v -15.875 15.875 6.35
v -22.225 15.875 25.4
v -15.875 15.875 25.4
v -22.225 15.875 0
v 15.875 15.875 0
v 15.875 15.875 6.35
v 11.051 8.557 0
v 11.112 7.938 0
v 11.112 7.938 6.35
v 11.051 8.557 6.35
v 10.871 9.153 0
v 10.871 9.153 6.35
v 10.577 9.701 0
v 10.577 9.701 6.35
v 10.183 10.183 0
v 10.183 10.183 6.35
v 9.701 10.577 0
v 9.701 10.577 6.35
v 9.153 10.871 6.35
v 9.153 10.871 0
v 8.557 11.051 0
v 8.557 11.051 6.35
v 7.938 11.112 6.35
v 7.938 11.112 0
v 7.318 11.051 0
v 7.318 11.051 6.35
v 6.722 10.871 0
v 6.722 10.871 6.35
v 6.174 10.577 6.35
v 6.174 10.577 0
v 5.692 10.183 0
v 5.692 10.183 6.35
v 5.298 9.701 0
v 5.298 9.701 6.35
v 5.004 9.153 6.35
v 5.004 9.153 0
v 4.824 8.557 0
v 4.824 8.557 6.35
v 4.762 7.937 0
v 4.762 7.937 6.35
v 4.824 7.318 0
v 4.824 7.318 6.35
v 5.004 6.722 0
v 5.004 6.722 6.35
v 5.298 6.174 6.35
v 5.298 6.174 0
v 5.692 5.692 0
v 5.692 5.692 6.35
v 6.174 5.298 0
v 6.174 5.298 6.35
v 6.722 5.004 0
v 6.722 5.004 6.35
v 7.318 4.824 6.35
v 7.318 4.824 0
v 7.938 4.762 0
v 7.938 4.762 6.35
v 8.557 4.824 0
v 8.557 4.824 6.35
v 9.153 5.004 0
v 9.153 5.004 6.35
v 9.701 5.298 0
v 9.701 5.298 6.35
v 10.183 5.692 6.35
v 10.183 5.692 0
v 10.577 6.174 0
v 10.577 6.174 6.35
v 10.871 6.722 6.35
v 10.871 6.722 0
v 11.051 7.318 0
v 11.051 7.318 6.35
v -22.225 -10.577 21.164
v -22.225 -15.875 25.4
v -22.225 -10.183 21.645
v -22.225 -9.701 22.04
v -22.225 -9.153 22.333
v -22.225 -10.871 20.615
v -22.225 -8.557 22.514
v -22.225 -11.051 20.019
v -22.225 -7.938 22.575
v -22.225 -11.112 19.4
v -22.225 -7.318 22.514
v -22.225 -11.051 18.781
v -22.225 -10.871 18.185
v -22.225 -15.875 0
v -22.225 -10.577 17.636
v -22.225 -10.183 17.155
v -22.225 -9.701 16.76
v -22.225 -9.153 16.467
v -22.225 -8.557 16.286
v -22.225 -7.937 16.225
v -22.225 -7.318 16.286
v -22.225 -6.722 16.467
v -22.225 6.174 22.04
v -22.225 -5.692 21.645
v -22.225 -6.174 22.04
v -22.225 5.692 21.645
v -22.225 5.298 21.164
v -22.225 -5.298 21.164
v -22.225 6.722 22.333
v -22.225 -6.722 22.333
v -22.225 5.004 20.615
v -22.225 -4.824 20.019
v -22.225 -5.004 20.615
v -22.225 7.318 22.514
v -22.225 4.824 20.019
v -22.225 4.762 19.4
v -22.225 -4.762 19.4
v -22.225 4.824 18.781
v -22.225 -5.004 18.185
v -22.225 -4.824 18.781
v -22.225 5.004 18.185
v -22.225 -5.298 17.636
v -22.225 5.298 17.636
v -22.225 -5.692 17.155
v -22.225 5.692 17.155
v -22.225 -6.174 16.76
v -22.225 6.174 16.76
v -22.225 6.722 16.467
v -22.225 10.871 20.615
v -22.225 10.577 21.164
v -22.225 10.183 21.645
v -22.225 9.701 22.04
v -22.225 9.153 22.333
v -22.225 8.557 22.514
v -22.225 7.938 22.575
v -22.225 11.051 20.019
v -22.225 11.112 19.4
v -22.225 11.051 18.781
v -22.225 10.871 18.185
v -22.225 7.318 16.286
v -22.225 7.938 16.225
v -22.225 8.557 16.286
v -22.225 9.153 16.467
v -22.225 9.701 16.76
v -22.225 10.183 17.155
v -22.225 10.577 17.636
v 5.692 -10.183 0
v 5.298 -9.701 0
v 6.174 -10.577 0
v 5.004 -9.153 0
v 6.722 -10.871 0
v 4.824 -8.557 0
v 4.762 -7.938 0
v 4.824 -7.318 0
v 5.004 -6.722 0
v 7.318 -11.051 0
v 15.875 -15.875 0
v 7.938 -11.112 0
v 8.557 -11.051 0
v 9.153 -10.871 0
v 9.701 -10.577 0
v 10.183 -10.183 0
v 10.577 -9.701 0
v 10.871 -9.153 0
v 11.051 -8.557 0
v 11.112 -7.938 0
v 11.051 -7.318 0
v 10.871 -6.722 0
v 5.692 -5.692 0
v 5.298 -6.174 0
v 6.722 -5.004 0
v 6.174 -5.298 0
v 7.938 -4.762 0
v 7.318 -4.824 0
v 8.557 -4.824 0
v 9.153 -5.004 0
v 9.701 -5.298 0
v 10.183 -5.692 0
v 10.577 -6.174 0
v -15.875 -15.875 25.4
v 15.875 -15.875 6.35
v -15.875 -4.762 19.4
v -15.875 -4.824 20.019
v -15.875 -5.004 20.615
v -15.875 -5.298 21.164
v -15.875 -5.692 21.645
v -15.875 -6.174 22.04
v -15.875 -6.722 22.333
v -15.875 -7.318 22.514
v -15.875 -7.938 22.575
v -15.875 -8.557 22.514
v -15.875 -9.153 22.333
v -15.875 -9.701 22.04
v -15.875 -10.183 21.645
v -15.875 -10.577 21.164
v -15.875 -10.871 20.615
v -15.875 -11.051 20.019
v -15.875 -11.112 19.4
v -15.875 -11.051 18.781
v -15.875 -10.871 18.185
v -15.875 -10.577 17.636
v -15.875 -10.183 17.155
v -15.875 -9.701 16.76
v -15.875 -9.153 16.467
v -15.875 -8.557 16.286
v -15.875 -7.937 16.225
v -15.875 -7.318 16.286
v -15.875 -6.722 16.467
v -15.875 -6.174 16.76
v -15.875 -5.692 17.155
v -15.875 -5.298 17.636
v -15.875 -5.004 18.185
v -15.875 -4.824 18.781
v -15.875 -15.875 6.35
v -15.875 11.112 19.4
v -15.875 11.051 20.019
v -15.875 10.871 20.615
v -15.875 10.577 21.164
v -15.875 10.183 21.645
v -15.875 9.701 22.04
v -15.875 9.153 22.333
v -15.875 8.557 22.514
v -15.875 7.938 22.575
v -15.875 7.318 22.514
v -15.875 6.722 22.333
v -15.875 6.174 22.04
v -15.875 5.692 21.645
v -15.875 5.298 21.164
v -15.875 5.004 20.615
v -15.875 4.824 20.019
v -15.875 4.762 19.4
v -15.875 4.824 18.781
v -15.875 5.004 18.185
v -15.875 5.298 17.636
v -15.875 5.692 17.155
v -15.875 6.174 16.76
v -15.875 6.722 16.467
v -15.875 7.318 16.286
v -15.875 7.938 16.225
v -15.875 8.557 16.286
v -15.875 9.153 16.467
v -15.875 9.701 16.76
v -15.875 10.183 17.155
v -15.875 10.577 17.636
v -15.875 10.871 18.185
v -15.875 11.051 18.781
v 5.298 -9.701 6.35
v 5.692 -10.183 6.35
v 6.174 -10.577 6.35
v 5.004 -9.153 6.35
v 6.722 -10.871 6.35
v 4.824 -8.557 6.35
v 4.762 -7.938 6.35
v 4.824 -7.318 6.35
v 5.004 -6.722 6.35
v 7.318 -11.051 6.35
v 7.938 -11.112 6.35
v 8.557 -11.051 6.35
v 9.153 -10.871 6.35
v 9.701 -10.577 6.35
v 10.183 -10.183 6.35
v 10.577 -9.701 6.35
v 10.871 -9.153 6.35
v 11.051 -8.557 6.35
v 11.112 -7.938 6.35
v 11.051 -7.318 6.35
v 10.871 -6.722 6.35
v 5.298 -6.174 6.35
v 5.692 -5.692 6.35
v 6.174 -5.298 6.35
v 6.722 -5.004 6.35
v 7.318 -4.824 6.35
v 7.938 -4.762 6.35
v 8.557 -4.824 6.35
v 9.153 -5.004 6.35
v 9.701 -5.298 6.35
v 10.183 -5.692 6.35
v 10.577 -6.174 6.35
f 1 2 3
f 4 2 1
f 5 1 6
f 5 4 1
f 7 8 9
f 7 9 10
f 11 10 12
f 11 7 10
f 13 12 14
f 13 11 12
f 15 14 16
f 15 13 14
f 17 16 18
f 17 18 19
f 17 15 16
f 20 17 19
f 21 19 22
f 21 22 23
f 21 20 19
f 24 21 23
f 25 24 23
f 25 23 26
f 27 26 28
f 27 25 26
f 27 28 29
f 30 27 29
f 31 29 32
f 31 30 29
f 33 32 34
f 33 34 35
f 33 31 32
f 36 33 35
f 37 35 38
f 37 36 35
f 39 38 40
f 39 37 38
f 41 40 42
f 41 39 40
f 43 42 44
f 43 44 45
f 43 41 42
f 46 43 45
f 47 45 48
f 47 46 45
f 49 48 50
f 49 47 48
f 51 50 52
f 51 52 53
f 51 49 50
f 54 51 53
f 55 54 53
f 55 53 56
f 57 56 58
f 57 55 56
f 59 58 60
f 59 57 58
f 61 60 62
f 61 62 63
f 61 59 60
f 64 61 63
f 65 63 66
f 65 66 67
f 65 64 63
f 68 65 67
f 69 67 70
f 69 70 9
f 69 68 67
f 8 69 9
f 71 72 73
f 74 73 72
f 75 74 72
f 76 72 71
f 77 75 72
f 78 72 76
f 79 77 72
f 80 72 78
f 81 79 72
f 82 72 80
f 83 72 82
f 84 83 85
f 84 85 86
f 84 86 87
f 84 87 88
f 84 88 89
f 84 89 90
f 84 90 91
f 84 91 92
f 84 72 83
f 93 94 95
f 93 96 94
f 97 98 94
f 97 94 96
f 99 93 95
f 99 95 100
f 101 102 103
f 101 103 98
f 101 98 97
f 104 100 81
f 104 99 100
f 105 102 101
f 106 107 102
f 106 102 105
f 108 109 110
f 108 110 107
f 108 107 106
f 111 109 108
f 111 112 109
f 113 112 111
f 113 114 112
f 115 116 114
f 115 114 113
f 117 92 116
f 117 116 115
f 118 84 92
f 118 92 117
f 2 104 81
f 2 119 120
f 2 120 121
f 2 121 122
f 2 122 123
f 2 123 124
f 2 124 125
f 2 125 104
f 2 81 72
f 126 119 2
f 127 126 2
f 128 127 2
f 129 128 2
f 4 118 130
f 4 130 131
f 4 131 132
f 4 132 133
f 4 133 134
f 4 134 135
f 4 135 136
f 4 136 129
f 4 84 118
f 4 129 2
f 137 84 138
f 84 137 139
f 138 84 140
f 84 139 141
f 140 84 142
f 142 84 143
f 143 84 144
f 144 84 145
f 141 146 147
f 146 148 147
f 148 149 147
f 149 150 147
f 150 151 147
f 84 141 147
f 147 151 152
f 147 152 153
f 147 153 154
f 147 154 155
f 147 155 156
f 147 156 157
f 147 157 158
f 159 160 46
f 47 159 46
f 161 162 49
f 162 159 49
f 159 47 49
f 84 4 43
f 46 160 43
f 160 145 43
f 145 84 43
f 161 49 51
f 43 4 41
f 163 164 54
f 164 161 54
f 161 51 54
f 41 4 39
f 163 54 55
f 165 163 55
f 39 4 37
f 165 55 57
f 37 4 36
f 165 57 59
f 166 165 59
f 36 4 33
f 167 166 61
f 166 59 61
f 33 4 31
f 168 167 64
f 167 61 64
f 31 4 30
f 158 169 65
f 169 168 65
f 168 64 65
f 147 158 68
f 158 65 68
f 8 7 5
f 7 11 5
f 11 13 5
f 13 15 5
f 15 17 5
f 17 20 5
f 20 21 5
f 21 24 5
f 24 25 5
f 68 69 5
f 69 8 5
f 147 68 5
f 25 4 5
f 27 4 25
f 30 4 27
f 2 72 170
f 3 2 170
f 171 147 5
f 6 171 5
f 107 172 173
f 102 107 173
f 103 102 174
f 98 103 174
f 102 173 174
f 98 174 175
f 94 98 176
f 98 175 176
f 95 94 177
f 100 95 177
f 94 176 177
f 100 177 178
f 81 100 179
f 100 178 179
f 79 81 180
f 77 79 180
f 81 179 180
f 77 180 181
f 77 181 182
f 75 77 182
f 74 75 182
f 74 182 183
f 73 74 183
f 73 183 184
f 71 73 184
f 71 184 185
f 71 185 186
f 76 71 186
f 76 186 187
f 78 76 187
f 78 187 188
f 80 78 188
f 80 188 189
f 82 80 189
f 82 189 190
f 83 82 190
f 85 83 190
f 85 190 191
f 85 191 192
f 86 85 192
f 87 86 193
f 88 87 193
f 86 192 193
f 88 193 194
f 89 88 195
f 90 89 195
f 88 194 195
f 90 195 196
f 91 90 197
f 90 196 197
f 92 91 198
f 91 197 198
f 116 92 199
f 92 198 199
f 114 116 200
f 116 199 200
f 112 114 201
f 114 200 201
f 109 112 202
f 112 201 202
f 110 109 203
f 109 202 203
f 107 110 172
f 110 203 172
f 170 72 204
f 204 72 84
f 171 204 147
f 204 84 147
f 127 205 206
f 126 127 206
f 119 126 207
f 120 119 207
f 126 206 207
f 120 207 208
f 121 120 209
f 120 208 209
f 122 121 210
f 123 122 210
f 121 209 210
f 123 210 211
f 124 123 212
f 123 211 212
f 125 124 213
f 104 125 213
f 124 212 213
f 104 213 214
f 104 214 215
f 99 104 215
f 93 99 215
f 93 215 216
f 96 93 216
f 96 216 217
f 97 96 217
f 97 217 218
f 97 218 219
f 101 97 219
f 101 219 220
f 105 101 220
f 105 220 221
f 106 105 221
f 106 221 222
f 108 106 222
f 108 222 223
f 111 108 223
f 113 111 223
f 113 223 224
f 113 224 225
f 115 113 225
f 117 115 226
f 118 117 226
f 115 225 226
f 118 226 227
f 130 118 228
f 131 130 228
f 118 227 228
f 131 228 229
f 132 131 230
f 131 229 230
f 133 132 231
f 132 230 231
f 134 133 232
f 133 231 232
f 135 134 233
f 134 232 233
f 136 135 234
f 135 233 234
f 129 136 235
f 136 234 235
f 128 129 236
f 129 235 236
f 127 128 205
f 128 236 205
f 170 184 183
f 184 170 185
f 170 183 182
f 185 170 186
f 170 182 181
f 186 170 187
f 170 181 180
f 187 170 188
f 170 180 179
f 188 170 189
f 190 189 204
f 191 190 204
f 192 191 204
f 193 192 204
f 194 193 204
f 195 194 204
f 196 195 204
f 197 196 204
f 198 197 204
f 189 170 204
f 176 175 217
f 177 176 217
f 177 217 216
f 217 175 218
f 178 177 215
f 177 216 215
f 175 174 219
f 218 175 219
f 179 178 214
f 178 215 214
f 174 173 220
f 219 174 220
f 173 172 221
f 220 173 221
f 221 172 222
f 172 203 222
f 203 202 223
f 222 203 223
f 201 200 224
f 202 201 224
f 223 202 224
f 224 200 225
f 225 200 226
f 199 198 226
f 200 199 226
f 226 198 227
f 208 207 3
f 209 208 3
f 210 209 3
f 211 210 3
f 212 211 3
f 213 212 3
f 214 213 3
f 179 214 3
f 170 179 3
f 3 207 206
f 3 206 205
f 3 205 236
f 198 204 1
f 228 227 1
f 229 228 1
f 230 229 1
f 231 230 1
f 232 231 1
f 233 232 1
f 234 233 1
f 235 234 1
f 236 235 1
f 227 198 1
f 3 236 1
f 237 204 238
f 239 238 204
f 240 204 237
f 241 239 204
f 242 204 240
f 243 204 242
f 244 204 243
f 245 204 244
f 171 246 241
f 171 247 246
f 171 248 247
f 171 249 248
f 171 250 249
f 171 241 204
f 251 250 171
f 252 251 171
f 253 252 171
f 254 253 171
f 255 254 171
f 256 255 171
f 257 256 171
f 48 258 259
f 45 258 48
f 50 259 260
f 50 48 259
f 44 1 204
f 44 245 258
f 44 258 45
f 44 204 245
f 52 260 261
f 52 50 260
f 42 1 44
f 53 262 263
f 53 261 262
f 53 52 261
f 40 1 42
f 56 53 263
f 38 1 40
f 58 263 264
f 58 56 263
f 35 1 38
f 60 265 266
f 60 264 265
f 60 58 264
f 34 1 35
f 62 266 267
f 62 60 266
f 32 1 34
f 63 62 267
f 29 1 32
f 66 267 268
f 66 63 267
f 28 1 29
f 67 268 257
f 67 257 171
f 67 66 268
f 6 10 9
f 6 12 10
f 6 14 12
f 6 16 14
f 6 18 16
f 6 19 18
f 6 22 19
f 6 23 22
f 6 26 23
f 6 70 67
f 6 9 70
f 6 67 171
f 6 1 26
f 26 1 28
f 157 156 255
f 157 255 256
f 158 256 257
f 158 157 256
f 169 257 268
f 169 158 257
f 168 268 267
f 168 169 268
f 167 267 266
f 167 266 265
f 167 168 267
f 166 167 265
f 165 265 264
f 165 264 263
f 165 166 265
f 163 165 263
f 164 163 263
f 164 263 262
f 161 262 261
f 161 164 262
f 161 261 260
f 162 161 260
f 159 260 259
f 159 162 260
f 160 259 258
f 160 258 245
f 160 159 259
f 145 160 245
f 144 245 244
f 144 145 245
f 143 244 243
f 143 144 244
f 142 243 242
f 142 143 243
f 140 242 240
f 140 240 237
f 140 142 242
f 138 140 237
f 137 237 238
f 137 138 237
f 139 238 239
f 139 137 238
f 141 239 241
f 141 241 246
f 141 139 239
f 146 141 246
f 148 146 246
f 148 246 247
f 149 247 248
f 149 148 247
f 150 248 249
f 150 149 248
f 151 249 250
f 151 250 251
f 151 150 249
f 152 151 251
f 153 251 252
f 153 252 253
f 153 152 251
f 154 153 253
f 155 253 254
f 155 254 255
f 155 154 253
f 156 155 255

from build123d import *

# Parameters (mm, degrees)
F0_W     = 31.75
F0_H     = 31.75
F0_R     = 3.175
F1_DEPTH = 6.35
F0_W_2   = 6.35
F2_DEPTH = 25.4
F3_R     = 3.175
F4_DEPTH = 25.4


with BuildPart() as f1:
    # F0 (on Top) → F1 (new body)
    with BuildSketch(Plane.XY):
        Rectangle(F0_W, F0_H)
        with Locations((7.9375, -7.9375)):
            Circle(F0_R, mode=Mode.SUBTRACT)
        with Locations((7.9375, 7.9375)):
            Circle(F0_R, mode=Mode.SUBTRACT)
    extrude(amount=F1_DEPTH)

    # F0 (on Top) → F2 (join)
    with BuildSketch(Plane.XY):
        with Locations((-19.05, 0)):
            Rectangle(F0_W_2, F0_H)
    extrude(amount=F2_DEPTH)

    # F3 (on face) → F4 (cut)
    with BuildSketch(Plane.YZ.offset(-15.875)):
        with Locations((-7.9375, 19.4)):
            Circle(F3_R)
        with Locations((7.9375, 19.4)):
            Circle(F3_R)
    extrude(amount=-F4_DEPTH, mode=Mode.SUBTRACT)


solid = f1.part
